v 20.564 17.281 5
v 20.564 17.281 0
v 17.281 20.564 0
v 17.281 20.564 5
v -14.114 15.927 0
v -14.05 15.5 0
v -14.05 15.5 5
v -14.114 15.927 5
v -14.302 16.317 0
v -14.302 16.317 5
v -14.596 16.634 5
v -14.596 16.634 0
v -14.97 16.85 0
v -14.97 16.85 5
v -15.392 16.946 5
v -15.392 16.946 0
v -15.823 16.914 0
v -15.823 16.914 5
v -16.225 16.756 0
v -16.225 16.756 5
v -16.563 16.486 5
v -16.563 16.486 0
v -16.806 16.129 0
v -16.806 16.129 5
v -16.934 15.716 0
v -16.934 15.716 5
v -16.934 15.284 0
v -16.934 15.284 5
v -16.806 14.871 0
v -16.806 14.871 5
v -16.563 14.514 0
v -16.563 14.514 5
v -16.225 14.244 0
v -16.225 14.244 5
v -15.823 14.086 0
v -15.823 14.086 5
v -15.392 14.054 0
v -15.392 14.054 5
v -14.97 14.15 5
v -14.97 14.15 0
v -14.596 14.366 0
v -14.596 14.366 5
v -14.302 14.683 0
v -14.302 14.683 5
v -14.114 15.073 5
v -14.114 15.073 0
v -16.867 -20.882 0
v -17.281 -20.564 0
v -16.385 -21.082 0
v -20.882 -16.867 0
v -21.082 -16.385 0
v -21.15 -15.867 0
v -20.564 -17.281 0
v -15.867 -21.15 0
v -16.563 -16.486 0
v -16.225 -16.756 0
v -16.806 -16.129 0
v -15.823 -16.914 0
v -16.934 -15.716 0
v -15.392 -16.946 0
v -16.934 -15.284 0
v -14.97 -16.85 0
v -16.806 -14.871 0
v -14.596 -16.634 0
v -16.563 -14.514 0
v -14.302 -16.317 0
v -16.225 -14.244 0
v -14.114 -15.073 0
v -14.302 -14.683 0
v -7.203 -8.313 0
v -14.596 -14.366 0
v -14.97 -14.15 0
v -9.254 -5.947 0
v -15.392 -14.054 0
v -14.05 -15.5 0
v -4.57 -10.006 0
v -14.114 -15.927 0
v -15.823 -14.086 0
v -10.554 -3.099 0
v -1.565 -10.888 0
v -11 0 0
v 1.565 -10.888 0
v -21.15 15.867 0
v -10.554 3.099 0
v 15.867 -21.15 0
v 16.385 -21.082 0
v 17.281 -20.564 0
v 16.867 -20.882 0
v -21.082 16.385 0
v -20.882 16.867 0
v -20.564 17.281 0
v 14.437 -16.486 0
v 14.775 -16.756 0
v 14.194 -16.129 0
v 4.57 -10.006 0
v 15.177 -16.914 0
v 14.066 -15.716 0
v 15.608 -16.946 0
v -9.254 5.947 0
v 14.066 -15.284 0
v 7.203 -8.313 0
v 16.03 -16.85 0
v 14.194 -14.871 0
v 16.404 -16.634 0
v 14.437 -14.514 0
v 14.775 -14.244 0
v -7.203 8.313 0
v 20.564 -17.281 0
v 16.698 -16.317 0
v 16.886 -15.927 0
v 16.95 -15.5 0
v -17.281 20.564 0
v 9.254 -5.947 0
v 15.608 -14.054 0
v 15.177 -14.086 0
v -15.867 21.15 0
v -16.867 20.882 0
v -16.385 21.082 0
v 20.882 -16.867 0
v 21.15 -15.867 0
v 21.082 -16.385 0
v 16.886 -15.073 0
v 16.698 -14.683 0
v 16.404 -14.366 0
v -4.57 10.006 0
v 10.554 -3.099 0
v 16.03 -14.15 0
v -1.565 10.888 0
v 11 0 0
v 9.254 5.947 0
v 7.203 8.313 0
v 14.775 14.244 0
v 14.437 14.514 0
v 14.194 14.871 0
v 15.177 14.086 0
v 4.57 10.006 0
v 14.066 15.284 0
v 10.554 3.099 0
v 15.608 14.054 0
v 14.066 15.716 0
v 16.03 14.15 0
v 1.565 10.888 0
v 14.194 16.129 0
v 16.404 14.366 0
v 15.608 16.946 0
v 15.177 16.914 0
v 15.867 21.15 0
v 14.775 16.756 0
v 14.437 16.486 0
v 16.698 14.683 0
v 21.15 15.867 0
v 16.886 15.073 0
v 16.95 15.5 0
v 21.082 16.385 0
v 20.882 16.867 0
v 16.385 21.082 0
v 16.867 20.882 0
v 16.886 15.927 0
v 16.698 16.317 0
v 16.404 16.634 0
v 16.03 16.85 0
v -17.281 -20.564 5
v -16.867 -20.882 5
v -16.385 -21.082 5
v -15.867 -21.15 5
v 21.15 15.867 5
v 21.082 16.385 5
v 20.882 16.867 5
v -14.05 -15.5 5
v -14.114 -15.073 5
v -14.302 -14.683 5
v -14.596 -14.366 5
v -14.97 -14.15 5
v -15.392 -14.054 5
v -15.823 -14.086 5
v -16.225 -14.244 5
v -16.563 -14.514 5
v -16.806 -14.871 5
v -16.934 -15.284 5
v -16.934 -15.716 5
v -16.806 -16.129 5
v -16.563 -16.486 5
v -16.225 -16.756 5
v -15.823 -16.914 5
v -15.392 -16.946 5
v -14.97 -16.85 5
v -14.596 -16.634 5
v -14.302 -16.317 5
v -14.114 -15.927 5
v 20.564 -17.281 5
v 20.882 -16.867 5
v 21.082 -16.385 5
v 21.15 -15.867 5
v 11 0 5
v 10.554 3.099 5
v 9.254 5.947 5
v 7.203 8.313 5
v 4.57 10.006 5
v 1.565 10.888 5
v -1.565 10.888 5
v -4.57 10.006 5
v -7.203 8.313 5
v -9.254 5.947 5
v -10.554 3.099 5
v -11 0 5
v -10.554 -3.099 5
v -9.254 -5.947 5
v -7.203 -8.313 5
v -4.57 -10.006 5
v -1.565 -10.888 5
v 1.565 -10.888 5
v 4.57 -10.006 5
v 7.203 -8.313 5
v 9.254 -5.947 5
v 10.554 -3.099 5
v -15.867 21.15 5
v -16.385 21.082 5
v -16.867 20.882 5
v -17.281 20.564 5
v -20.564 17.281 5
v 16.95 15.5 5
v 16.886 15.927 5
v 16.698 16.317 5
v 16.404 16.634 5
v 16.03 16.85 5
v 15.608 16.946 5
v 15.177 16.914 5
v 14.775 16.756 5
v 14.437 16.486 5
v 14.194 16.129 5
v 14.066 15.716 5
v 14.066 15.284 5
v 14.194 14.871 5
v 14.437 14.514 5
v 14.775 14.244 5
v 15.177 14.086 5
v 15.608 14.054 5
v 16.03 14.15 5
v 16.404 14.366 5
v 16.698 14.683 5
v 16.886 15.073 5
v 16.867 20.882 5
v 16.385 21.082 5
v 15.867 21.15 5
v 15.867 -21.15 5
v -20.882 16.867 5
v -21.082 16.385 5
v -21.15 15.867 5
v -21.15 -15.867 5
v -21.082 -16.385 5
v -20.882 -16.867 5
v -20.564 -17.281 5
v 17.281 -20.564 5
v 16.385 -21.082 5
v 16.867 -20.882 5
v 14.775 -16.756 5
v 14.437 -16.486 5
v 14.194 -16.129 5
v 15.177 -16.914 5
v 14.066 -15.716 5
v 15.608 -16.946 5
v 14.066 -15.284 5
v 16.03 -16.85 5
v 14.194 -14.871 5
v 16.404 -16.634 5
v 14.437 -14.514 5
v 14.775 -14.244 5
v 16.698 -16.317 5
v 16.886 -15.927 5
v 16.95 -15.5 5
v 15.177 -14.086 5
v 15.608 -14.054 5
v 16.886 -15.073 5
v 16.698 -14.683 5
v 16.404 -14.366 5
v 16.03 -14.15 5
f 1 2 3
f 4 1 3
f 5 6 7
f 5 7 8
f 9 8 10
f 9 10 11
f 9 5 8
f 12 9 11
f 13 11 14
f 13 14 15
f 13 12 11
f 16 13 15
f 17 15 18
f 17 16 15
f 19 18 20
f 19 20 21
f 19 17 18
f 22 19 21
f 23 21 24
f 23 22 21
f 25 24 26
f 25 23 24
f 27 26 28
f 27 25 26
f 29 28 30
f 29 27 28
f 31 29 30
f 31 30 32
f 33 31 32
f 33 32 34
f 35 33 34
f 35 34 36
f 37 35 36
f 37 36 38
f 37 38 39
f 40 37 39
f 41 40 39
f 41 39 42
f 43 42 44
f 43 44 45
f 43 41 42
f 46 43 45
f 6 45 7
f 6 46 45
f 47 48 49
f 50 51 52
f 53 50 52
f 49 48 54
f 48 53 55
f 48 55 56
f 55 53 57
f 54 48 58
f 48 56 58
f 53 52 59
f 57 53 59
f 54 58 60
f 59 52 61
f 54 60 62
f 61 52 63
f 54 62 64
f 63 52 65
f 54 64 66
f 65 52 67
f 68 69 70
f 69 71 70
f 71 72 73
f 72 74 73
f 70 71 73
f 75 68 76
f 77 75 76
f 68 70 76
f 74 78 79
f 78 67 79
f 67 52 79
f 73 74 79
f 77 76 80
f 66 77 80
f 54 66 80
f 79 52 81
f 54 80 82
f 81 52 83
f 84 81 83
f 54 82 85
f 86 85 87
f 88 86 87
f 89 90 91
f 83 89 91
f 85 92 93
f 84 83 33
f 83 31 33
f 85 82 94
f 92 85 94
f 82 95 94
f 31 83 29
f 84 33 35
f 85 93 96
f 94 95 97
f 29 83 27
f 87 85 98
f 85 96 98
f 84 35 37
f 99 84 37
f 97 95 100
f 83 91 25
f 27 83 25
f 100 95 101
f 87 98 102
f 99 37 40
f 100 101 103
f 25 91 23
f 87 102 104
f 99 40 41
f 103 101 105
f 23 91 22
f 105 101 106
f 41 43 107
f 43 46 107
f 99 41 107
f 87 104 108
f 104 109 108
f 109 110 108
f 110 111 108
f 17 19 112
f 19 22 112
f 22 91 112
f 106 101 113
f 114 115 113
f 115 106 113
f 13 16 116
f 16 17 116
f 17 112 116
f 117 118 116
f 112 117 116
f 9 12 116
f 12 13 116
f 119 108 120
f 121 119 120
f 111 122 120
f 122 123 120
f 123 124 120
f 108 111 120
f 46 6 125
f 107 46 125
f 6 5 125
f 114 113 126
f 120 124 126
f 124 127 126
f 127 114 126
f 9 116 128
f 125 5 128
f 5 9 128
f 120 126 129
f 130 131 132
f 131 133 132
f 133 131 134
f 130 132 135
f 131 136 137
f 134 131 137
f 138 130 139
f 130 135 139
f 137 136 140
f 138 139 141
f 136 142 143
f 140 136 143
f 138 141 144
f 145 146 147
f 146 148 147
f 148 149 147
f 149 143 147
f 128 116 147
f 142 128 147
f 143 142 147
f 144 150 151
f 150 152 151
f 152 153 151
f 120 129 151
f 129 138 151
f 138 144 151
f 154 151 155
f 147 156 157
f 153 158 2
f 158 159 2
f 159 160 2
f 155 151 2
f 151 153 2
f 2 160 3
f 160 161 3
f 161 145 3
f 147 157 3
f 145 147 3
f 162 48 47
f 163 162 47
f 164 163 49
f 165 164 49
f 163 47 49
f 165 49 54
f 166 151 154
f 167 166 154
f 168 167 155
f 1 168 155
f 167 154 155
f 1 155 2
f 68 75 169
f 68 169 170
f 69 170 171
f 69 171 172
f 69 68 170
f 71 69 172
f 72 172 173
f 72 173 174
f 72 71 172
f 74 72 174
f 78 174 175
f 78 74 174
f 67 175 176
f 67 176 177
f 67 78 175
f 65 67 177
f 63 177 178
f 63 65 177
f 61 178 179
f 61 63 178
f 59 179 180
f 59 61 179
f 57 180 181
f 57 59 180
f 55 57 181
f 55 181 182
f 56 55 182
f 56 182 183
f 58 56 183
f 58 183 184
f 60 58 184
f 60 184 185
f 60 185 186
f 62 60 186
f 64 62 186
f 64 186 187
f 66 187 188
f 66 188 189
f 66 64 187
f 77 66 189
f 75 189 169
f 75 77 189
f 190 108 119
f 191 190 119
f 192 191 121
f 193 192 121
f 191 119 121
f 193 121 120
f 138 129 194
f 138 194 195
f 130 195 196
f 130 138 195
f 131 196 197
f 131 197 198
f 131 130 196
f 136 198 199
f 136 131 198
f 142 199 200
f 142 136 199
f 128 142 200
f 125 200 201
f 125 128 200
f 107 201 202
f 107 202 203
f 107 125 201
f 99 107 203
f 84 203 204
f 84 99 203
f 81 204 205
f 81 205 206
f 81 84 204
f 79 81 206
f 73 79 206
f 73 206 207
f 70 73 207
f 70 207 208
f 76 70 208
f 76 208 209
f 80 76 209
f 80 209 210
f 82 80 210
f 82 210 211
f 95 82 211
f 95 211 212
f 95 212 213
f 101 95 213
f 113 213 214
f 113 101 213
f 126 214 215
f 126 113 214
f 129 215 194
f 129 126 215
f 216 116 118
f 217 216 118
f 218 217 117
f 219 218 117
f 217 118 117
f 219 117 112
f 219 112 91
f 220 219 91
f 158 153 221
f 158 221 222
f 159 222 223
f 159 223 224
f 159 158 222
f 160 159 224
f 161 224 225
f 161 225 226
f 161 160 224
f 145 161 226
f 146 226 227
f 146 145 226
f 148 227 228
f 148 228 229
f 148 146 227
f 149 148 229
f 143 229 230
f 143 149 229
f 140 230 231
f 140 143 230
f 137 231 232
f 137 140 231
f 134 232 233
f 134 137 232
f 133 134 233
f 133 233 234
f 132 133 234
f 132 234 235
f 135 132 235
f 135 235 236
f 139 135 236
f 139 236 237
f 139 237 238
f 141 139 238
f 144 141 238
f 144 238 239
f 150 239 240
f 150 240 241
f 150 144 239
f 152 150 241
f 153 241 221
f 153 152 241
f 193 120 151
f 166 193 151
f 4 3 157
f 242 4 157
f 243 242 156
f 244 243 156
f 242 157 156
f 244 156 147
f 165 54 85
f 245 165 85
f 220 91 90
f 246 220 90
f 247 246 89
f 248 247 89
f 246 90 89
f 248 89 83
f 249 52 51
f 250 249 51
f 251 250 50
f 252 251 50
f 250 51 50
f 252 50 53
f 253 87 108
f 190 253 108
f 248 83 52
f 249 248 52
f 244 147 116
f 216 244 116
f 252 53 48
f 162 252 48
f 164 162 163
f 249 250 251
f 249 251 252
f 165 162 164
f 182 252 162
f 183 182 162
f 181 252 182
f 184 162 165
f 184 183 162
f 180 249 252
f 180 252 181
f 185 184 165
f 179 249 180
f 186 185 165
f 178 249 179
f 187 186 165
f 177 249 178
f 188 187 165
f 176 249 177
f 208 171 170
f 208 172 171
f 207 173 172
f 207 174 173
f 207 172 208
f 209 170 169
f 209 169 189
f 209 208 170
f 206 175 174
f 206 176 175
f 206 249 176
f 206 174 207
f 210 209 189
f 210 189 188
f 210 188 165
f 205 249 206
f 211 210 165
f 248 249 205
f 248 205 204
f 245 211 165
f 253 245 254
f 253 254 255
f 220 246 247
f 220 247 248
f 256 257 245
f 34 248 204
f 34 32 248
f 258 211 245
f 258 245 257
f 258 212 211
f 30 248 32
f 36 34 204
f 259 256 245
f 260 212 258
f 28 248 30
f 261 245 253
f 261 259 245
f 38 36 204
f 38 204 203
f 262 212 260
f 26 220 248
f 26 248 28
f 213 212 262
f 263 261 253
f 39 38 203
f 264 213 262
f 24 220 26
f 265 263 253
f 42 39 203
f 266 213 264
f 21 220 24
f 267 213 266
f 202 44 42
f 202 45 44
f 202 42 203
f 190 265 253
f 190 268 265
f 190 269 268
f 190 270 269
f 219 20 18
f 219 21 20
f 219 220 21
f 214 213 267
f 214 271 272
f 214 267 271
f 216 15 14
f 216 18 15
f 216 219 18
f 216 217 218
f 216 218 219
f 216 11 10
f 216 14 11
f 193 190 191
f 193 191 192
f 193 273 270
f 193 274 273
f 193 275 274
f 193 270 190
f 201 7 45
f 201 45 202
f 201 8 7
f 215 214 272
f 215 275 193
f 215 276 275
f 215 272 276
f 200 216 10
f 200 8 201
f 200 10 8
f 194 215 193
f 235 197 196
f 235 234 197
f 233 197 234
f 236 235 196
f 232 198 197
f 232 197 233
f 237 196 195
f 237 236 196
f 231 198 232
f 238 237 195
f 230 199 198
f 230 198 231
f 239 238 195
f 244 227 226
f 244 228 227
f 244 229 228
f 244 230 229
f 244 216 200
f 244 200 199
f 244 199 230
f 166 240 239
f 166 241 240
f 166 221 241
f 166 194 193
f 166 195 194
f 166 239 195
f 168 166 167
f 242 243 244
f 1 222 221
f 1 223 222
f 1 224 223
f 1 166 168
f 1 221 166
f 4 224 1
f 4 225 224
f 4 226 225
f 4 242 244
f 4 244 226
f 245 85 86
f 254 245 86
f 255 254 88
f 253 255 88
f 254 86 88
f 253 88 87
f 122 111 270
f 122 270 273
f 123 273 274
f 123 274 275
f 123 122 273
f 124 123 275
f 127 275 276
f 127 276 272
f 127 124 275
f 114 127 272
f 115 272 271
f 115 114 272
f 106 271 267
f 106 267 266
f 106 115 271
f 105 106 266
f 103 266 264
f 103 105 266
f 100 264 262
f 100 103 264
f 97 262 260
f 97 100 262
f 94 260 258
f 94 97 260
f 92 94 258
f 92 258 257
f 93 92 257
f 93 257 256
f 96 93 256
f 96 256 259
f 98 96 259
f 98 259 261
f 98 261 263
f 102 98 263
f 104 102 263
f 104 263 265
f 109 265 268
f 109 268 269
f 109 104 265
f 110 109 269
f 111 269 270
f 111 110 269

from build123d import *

# Parameters (mm, degrees)
SKETCH1_R           = 1.45
SKETCH1_R_2         = 11
BOSS_EXTRUDE1_DEPTH = 5


with BuildPart() as part:
    # Sketch1 → Boss-Extrude1 (new body)
    with BuildSketch(Plane.XY):
        with BuildLine():
            Line((-20.564213562, -17.28137085), (-17.28137085, -20.564213562))
            ThreePointArc((-17.28137085, -20.564213562), (-16.632524152, -20.997759065), (-15.867157288, -21.15))
            Line((-15.867157288, -21.15), (15.867157288, -21.15))
            ThreePointArc((15.867157288, -21.15), (16.632524152, -20.997759065), (17.28137085, -20.564213562))
            Line((17.28137085, -20.564213562), (20.564213562, -17.28137085))
            ThreePointArc((20.564213562, -17.28137085), (20.997759065, -16.632524152), (21.15, -15.867157288))
            Line((21.15, -15.867157288), (21.15, 15.867157288))
            ThreePointArc((21.15, 15.867157288), (20.997759065, 16.632524152), (20.564213562, 17.28137085))
            Line((20.564213562, 17.28137085), (17.28137085, 20.564213562))
            ThreePointArc((17.28137085, 20.564213562), (16.632524152, 20.997759065), (15.867157288, 21.15))
            Line((15.867157288, 21.15), (-15.867157288, 21.15))
            ThreePointArc((-15.867157288, 21.15), (-16.632524152, 20.997759065), (-17.28137085, 20.564213562))
            Line((-17.28137085, 20.564213562), (-20.564213562, 17.28137085))
            ThreePointArc((-20.564213562, 17.28137085), (-20.997759065, 16.632524152), (-21.15, 15.867157288))
            Line((-21.15, 15.867157288), (-21.15, -15.867157288))
            ThreePointArc((-21.15, -15.867157288), (-20.997759065, -16.632524152), (-20.564213562, -17.28137085))
        make_face()
        with Locations((-15.5, 15.5)):
            Circle(SKETCH1_R, mode=Mode.SUBTRACT)
        with Locations((15.5, 15.5)):
            Circle(SKETCH1_R, mode=Mode.SUBTRACT)
        with Locations((15.5, -15.5)):
            Circle(SKETCH1_R, mode=Mode.SUBTRACT)
        with Locations((-15.5, -15.5)):
            Circle(SKETCH1_R, mode=Mode.SUBTRACT)
        Circle(SKETCH1_R_2, mode=Mode.SUBTRACT)
    extrude(amount=BOSS_EXTRUDE1_DEPTH)


solid = part.part
